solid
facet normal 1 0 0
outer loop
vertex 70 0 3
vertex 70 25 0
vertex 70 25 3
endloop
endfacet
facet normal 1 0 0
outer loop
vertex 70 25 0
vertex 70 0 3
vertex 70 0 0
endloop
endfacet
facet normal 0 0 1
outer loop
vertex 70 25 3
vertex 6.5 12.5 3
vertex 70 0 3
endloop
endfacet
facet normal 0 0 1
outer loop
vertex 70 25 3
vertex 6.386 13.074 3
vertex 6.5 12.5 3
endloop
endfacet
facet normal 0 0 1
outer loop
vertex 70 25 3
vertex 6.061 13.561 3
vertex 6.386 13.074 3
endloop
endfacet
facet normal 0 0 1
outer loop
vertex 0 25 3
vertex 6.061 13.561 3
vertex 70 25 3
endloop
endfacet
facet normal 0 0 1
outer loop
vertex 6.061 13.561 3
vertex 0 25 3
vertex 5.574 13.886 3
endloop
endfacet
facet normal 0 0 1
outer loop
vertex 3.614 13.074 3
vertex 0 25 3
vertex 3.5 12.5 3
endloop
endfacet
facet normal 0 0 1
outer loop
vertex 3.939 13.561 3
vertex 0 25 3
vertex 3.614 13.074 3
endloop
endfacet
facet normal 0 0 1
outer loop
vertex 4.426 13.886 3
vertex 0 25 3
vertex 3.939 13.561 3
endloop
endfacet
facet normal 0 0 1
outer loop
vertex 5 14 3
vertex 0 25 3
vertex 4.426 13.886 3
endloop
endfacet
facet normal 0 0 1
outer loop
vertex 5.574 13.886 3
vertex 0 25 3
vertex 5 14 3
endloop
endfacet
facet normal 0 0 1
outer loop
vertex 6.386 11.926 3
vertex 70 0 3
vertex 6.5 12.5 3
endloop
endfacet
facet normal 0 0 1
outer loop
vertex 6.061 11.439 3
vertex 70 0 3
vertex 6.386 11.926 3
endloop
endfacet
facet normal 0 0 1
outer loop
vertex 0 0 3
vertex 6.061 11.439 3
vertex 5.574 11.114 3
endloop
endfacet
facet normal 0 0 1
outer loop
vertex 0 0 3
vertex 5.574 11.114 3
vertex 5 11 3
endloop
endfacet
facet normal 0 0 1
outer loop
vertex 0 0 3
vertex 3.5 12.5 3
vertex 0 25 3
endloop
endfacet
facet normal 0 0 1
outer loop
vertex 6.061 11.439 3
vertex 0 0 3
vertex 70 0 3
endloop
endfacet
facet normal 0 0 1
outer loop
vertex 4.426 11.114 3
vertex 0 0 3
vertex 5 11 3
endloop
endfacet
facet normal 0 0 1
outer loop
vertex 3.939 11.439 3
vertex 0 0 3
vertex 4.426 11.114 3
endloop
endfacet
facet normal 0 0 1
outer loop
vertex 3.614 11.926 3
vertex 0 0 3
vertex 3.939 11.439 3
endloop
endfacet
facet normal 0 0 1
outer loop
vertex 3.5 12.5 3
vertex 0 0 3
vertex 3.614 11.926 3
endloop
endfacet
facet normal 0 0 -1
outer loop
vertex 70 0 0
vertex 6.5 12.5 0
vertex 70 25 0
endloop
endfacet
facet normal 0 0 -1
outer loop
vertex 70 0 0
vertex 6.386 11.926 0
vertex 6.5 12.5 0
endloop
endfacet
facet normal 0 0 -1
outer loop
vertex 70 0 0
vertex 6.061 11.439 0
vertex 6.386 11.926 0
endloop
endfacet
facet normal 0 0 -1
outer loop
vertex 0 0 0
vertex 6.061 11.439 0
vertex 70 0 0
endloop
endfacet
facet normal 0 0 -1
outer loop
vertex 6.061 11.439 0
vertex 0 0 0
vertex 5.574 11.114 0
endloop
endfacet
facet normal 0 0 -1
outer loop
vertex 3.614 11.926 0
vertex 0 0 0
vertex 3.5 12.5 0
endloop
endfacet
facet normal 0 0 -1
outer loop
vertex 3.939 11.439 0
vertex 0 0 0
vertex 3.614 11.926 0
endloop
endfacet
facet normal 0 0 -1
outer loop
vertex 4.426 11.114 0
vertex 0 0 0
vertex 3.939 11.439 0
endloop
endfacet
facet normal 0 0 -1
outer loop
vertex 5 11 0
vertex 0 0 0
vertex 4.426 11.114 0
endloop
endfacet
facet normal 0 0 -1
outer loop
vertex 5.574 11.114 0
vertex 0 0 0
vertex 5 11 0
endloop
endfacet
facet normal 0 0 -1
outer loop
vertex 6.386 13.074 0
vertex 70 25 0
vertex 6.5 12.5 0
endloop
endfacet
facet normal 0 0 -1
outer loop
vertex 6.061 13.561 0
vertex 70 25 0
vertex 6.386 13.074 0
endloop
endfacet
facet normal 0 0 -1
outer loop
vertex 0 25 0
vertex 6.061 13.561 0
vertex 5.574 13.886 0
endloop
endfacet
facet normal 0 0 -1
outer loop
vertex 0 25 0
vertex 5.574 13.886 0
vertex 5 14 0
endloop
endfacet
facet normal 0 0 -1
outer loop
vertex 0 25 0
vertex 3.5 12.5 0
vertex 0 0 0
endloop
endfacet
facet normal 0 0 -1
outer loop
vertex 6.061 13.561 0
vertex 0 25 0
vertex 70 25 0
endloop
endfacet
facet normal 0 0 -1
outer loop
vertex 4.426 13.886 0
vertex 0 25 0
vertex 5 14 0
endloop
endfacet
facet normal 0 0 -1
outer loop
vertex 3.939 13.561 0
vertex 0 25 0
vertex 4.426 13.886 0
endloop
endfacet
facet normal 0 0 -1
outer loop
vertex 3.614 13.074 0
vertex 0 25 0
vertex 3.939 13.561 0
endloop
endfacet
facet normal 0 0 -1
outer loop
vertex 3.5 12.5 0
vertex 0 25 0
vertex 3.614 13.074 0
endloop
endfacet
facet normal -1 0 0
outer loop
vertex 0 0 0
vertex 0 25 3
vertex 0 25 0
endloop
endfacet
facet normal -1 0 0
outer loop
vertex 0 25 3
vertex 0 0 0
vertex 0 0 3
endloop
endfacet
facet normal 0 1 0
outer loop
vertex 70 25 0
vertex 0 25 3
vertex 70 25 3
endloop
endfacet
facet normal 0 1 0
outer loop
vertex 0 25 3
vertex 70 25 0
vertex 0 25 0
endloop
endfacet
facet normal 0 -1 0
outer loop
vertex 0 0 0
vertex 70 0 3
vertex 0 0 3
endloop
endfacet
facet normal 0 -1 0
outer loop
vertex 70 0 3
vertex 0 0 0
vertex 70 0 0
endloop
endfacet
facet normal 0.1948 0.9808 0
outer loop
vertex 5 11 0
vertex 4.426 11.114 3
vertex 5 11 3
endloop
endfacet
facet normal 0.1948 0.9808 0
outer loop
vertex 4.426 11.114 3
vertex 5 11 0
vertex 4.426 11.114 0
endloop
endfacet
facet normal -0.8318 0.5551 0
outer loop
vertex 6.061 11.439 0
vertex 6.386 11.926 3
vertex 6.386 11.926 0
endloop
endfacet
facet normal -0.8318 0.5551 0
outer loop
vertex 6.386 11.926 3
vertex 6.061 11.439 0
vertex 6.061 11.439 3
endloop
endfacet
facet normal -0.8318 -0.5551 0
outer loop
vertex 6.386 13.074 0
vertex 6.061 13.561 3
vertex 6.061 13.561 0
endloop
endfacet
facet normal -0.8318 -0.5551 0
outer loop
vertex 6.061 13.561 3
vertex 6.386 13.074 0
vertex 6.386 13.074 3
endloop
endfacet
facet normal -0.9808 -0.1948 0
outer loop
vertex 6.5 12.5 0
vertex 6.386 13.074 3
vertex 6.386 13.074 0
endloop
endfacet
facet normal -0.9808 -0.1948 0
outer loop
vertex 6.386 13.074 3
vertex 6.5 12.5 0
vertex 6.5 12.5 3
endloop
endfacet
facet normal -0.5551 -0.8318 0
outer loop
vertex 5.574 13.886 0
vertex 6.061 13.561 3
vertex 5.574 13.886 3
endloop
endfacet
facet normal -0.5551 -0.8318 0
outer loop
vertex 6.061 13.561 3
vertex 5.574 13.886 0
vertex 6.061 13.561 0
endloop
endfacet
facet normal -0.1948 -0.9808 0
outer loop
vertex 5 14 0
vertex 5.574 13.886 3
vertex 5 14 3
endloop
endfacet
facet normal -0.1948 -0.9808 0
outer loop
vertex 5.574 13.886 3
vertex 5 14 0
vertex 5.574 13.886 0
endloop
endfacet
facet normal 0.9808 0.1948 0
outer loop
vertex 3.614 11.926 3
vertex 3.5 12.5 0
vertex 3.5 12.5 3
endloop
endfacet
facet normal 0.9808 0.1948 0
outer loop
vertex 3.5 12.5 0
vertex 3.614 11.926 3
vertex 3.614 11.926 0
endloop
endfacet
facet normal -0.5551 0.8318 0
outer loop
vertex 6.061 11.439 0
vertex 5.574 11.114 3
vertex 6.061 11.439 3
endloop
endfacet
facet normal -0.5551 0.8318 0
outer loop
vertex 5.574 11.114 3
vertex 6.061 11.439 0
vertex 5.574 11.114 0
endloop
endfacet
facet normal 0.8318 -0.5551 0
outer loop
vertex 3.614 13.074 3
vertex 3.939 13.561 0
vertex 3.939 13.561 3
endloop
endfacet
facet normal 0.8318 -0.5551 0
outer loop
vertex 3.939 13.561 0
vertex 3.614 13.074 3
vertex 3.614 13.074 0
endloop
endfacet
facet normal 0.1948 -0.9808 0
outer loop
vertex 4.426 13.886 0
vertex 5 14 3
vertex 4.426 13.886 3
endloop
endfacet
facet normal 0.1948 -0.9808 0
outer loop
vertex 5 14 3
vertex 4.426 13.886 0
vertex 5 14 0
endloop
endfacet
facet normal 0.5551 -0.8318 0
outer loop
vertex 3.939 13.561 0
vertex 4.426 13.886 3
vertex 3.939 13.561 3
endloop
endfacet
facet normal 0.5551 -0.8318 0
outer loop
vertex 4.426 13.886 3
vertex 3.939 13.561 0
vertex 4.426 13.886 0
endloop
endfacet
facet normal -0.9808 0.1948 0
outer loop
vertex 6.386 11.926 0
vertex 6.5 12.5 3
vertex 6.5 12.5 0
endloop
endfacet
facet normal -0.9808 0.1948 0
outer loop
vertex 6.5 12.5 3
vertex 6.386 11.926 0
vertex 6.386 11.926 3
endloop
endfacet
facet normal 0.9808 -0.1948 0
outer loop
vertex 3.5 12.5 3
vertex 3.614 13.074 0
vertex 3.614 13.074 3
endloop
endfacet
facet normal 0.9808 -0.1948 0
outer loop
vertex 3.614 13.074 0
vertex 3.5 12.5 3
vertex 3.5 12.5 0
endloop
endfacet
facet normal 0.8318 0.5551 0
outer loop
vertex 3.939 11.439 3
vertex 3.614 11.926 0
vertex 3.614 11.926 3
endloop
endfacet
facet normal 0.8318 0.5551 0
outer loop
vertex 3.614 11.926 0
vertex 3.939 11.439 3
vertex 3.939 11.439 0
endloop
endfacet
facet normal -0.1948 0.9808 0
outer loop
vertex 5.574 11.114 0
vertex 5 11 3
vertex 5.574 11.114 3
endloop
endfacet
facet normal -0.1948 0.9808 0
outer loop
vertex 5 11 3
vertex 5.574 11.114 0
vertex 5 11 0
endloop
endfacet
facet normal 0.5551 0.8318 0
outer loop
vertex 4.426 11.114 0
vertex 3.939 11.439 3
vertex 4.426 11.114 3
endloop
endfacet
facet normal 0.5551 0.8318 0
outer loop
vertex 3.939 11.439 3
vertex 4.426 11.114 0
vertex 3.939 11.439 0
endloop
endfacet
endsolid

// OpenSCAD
// Name Tag (text() will fail gracefully until v2.0)

/* [Tag Settings] */
tag_width = 70;       // [40:100]
tag_height = 25;      // [15:40]
tag_depth = 3;        // [2:5]
corner_r = 3;         // [0:8]
hole_diameter = 3;    // [2:5]

// Base plate
difference() {
    cube([tag_width, tag_height, tag_depth]);

    // Lanyard hole
    translate([5, tag_height/2, -1])
        cylinder(h=tag_depth+2, d=hole_diameter, $fn=16);
}

// Note: text() not yet supported in v1.0
// text("OpenSCAD", size=10);
